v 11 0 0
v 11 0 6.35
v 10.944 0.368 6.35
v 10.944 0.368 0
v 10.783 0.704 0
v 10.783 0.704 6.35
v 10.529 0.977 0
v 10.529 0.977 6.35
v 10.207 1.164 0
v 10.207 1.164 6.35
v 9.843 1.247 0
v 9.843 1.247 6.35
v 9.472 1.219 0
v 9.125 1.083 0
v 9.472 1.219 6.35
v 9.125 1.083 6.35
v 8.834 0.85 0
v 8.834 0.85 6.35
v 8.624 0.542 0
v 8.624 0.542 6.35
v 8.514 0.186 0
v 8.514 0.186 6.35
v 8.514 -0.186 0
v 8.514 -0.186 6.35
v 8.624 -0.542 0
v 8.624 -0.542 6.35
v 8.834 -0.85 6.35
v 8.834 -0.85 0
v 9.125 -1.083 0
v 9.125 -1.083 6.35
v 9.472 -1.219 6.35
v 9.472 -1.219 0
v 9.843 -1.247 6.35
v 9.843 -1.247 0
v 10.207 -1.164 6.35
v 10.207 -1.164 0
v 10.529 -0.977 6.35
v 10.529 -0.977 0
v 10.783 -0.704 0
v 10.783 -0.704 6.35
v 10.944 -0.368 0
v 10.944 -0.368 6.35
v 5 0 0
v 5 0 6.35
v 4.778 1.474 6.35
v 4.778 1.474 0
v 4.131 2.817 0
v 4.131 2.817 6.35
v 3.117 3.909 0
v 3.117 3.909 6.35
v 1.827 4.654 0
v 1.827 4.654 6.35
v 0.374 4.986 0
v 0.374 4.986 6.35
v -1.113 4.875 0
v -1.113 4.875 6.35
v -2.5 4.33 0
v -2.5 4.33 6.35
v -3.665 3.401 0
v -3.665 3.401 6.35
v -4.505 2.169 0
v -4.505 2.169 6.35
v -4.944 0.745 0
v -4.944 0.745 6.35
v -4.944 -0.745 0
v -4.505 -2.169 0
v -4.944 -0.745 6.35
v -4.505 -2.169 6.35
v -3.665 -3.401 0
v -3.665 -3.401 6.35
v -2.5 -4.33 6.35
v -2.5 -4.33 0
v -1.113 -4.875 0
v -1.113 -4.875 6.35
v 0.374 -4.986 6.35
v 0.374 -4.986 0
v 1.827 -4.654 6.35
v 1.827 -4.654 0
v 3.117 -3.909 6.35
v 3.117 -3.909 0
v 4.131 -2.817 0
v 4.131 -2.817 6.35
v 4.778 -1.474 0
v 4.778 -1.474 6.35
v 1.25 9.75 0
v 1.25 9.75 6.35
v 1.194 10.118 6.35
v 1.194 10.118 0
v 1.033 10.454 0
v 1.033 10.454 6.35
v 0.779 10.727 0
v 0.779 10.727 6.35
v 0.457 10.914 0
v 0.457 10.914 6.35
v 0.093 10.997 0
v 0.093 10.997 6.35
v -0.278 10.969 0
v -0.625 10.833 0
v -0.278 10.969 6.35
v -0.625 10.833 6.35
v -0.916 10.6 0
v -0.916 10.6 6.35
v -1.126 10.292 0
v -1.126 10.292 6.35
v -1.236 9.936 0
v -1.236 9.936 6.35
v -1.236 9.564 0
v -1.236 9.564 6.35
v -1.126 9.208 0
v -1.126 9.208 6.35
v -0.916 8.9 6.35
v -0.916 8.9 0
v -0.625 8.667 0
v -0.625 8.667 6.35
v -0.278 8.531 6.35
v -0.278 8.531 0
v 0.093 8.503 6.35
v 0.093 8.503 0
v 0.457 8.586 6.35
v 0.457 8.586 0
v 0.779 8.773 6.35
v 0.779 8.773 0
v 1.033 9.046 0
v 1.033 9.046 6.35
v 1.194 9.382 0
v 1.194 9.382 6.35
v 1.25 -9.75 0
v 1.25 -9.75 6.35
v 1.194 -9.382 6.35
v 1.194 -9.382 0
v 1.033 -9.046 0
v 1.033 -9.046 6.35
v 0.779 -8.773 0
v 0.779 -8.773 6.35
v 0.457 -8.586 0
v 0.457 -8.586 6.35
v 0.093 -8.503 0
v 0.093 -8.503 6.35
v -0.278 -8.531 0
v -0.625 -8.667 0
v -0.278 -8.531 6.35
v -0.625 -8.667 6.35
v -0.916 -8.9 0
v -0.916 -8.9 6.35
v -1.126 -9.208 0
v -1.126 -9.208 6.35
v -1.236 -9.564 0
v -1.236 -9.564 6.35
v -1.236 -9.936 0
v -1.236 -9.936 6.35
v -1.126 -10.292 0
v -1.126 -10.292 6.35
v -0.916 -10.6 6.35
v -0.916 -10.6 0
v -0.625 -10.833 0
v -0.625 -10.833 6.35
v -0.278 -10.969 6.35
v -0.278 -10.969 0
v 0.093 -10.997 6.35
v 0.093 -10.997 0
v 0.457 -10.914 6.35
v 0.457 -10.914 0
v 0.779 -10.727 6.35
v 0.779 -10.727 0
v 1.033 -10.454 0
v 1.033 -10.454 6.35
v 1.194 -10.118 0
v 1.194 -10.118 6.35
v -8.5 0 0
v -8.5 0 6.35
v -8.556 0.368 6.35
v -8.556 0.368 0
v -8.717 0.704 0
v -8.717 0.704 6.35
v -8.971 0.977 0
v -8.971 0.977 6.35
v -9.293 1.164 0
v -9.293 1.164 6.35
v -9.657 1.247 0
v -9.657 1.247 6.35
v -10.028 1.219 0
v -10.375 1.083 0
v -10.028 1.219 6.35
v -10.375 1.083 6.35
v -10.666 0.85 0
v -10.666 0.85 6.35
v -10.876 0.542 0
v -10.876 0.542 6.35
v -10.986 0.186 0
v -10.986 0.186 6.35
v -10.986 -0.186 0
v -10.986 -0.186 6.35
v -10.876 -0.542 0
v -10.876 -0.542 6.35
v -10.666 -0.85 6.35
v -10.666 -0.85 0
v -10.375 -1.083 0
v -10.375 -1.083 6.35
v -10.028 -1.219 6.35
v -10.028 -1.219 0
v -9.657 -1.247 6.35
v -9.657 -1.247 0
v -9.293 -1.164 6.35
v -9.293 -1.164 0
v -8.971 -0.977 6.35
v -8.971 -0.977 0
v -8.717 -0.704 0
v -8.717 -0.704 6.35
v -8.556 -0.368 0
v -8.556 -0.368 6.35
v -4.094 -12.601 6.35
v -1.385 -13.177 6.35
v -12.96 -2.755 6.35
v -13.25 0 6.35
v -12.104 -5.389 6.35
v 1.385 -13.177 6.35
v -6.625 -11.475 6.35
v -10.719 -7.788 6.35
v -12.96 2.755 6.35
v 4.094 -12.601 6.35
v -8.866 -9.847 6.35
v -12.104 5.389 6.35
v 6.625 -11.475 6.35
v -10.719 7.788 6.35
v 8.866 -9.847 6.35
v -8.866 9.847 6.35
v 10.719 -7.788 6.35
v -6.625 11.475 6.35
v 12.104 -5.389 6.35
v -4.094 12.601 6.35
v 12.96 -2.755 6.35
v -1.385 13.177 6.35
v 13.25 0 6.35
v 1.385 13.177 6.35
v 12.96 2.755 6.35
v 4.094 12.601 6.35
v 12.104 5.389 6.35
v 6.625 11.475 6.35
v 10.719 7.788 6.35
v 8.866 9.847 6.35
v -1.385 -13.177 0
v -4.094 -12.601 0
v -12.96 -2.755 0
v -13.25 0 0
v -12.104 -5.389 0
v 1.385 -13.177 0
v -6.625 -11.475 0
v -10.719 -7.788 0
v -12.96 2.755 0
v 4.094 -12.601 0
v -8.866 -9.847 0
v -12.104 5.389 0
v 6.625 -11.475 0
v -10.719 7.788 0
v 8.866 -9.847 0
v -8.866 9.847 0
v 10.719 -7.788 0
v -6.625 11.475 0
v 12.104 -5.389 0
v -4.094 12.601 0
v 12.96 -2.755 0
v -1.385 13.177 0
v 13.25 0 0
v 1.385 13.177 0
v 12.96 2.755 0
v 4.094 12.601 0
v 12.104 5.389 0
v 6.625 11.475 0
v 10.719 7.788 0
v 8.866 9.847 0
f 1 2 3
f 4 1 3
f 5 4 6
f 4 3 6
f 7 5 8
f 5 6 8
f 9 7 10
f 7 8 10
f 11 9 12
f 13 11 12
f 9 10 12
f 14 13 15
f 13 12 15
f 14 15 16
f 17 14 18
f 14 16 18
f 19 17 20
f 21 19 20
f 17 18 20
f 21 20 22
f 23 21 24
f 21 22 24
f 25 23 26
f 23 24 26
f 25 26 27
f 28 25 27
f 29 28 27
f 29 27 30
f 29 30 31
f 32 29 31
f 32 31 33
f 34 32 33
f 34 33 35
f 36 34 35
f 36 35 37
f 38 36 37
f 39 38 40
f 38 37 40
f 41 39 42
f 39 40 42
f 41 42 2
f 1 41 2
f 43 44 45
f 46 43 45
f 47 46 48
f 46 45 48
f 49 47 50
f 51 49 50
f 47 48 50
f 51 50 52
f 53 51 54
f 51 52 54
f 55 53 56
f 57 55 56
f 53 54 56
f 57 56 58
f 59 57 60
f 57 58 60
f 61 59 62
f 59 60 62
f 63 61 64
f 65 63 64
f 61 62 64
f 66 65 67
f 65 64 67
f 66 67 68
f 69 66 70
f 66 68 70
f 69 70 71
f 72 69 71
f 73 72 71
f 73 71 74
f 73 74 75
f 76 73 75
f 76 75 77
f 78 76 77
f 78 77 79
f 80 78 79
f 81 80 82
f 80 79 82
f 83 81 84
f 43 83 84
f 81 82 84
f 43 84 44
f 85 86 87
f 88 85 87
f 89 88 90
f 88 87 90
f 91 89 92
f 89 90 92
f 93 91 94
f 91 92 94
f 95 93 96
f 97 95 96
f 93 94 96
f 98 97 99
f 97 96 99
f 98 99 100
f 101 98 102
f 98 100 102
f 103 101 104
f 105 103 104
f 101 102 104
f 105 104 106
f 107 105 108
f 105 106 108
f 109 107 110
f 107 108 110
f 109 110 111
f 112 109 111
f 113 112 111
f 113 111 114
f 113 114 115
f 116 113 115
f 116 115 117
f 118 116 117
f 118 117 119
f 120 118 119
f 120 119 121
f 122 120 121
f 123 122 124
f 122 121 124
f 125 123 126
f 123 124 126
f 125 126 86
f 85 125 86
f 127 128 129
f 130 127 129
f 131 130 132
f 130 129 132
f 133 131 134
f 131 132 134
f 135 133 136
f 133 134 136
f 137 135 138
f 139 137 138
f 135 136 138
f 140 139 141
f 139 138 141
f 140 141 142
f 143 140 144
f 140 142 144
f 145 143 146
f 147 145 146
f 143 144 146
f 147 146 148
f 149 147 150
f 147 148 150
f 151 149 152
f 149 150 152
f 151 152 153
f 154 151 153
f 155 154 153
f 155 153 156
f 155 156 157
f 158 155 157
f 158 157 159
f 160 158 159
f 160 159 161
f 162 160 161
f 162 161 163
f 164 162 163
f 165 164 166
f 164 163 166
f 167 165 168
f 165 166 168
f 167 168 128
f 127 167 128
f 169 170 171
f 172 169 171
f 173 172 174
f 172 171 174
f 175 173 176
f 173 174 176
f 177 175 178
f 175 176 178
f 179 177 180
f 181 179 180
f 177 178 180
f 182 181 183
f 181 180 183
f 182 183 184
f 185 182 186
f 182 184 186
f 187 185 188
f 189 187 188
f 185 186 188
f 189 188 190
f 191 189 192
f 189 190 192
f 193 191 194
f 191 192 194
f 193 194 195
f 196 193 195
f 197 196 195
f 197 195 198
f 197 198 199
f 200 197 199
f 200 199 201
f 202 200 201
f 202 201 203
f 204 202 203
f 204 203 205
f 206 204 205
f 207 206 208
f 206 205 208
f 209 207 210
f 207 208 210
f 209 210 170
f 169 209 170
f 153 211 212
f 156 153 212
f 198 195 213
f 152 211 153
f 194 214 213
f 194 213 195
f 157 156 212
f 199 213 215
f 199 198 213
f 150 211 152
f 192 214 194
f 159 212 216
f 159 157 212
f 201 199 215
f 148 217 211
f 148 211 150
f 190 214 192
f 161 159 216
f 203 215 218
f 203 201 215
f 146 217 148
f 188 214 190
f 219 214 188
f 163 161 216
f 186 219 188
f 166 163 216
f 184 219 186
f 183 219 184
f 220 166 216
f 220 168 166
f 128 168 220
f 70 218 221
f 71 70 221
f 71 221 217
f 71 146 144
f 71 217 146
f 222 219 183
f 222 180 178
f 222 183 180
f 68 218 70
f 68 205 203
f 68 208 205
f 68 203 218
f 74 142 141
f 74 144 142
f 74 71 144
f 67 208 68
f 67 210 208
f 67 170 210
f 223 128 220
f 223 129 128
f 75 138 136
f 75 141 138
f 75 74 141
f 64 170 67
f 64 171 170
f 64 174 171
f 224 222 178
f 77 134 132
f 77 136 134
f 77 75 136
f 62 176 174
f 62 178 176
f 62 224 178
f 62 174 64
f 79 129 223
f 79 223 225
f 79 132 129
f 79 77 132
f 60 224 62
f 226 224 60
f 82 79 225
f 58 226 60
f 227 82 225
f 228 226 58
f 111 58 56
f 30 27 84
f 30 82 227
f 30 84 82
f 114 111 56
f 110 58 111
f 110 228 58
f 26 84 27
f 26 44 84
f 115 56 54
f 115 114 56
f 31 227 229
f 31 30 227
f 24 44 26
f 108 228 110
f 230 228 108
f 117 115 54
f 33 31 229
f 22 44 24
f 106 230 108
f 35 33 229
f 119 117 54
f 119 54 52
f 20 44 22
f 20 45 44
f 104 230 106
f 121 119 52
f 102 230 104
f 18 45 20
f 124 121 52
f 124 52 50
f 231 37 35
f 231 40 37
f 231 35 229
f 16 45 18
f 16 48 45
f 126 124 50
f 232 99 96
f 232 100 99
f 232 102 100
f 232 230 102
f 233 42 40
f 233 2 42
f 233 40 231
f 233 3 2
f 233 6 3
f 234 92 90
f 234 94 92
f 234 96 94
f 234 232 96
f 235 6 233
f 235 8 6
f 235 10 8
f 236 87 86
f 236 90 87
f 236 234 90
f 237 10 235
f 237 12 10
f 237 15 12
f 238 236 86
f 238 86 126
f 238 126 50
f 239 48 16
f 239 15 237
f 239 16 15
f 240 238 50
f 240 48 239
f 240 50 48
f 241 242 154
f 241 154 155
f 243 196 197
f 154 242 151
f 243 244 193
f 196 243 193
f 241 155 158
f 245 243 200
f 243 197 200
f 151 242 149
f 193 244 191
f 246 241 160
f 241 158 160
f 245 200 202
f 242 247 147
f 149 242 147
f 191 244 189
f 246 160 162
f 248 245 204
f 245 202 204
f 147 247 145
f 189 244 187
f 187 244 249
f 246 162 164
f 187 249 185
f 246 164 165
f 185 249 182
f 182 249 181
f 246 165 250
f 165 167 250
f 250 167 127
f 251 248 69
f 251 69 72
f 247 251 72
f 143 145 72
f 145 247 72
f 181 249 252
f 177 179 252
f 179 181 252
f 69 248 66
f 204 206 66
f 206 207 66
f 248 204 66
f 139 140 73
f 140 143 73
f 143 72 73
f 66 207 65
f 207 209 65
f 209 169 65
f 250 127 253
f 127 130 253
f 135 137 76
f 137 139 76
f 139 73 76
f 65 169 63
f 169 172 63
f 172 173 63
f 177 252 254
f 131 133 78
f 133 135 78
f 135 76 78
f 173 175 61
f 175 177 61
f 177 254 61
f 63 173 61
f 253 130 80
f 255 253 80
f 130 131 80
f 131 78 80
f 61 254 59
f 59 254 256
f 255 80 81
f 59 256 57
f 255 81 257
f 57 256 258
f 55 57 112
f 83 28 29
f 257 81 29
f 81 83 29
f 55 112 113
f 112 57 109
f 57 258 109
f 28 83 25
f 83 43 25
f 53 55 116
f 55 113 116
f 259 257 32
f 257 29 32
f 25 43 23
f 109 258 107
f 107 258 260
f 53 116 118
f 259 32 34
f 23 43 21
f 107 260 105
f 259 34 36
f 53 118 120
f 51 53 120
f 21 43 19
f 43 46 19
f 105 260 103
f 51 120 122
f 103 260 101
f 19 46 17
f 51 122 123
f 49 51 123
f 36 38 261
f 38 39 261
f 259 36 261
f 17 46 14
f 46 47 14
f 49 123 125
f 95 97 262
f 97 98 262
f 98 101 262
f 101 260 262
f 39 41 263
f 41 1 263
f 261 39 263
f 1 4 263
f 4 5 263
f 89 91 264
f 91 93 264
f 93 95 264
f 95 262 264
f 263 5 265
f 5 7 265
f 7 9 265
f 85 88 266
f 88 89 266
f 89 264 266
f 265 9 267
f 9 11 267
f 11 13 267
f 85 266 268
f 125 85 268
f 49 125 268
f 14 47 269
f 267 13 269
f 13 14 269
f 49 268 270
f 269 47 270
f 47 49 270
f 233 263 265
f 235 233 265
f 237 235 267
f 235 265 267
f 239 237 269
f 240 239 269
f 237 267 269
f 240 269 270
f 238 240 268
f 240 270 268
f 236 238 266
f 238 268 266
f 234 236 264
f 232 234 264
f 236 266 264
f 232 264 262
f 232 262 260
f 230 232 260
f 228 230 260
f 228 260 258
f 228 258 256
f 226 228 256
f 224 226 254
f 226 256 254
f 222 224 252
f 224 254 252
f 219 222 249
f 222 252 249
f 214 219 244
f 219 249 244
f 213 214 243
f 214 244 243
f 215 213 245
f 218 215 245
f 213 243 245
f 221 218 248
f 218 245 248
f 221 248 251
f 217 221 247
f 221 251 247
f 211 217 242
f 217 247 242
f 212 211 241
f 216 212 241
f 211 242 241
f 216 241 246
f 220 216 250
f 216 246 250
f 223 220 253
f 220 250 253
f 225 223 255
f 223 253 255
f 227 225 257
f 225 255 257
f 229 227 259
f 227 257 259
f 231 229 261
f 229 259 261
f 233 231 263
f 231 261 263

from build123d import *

# Parameters (mm, degrees)
SKETCH3_R           = 13.25
BOSS_EXTRUDE1_DEPTH = 6.35
SKETCH4_R           = 5
SKETCH4_R_2         = 1.25
CUT_EXTRUDE1_DEPTH  = 6.35


with BuildPart() as part:
    # Sketch3 → Boss-Extrude1 (new body)
    with BuildSketch(Plane.XY):
        Circle(SKETCH3_R)
    extrude(amount=BOSS_EXTRUDE1_DEPTH)

    # Sketch4 → Cut-Extrude1 (cut)
    with BuildSketch(Plane.XY.offset(6.35)):
        Circle(SKETCH4_R)
        with Locations((0, 9.75)):
            Circle(SKETCH4_R_2)
        with Locations((9.75, 0)):
            Circle(SKETCH4_R_2)
        with Locations((0, -9.75)):
            Circle(SKETCH4_R_2)
        with Locations((-9.75, 0)):
            Circle(SKETCH4_R_2)
    extrude(amount=-CUT_EXTRUDE1_DEPTH, mode=Mode.SUBTRACT)


solid = part.part
